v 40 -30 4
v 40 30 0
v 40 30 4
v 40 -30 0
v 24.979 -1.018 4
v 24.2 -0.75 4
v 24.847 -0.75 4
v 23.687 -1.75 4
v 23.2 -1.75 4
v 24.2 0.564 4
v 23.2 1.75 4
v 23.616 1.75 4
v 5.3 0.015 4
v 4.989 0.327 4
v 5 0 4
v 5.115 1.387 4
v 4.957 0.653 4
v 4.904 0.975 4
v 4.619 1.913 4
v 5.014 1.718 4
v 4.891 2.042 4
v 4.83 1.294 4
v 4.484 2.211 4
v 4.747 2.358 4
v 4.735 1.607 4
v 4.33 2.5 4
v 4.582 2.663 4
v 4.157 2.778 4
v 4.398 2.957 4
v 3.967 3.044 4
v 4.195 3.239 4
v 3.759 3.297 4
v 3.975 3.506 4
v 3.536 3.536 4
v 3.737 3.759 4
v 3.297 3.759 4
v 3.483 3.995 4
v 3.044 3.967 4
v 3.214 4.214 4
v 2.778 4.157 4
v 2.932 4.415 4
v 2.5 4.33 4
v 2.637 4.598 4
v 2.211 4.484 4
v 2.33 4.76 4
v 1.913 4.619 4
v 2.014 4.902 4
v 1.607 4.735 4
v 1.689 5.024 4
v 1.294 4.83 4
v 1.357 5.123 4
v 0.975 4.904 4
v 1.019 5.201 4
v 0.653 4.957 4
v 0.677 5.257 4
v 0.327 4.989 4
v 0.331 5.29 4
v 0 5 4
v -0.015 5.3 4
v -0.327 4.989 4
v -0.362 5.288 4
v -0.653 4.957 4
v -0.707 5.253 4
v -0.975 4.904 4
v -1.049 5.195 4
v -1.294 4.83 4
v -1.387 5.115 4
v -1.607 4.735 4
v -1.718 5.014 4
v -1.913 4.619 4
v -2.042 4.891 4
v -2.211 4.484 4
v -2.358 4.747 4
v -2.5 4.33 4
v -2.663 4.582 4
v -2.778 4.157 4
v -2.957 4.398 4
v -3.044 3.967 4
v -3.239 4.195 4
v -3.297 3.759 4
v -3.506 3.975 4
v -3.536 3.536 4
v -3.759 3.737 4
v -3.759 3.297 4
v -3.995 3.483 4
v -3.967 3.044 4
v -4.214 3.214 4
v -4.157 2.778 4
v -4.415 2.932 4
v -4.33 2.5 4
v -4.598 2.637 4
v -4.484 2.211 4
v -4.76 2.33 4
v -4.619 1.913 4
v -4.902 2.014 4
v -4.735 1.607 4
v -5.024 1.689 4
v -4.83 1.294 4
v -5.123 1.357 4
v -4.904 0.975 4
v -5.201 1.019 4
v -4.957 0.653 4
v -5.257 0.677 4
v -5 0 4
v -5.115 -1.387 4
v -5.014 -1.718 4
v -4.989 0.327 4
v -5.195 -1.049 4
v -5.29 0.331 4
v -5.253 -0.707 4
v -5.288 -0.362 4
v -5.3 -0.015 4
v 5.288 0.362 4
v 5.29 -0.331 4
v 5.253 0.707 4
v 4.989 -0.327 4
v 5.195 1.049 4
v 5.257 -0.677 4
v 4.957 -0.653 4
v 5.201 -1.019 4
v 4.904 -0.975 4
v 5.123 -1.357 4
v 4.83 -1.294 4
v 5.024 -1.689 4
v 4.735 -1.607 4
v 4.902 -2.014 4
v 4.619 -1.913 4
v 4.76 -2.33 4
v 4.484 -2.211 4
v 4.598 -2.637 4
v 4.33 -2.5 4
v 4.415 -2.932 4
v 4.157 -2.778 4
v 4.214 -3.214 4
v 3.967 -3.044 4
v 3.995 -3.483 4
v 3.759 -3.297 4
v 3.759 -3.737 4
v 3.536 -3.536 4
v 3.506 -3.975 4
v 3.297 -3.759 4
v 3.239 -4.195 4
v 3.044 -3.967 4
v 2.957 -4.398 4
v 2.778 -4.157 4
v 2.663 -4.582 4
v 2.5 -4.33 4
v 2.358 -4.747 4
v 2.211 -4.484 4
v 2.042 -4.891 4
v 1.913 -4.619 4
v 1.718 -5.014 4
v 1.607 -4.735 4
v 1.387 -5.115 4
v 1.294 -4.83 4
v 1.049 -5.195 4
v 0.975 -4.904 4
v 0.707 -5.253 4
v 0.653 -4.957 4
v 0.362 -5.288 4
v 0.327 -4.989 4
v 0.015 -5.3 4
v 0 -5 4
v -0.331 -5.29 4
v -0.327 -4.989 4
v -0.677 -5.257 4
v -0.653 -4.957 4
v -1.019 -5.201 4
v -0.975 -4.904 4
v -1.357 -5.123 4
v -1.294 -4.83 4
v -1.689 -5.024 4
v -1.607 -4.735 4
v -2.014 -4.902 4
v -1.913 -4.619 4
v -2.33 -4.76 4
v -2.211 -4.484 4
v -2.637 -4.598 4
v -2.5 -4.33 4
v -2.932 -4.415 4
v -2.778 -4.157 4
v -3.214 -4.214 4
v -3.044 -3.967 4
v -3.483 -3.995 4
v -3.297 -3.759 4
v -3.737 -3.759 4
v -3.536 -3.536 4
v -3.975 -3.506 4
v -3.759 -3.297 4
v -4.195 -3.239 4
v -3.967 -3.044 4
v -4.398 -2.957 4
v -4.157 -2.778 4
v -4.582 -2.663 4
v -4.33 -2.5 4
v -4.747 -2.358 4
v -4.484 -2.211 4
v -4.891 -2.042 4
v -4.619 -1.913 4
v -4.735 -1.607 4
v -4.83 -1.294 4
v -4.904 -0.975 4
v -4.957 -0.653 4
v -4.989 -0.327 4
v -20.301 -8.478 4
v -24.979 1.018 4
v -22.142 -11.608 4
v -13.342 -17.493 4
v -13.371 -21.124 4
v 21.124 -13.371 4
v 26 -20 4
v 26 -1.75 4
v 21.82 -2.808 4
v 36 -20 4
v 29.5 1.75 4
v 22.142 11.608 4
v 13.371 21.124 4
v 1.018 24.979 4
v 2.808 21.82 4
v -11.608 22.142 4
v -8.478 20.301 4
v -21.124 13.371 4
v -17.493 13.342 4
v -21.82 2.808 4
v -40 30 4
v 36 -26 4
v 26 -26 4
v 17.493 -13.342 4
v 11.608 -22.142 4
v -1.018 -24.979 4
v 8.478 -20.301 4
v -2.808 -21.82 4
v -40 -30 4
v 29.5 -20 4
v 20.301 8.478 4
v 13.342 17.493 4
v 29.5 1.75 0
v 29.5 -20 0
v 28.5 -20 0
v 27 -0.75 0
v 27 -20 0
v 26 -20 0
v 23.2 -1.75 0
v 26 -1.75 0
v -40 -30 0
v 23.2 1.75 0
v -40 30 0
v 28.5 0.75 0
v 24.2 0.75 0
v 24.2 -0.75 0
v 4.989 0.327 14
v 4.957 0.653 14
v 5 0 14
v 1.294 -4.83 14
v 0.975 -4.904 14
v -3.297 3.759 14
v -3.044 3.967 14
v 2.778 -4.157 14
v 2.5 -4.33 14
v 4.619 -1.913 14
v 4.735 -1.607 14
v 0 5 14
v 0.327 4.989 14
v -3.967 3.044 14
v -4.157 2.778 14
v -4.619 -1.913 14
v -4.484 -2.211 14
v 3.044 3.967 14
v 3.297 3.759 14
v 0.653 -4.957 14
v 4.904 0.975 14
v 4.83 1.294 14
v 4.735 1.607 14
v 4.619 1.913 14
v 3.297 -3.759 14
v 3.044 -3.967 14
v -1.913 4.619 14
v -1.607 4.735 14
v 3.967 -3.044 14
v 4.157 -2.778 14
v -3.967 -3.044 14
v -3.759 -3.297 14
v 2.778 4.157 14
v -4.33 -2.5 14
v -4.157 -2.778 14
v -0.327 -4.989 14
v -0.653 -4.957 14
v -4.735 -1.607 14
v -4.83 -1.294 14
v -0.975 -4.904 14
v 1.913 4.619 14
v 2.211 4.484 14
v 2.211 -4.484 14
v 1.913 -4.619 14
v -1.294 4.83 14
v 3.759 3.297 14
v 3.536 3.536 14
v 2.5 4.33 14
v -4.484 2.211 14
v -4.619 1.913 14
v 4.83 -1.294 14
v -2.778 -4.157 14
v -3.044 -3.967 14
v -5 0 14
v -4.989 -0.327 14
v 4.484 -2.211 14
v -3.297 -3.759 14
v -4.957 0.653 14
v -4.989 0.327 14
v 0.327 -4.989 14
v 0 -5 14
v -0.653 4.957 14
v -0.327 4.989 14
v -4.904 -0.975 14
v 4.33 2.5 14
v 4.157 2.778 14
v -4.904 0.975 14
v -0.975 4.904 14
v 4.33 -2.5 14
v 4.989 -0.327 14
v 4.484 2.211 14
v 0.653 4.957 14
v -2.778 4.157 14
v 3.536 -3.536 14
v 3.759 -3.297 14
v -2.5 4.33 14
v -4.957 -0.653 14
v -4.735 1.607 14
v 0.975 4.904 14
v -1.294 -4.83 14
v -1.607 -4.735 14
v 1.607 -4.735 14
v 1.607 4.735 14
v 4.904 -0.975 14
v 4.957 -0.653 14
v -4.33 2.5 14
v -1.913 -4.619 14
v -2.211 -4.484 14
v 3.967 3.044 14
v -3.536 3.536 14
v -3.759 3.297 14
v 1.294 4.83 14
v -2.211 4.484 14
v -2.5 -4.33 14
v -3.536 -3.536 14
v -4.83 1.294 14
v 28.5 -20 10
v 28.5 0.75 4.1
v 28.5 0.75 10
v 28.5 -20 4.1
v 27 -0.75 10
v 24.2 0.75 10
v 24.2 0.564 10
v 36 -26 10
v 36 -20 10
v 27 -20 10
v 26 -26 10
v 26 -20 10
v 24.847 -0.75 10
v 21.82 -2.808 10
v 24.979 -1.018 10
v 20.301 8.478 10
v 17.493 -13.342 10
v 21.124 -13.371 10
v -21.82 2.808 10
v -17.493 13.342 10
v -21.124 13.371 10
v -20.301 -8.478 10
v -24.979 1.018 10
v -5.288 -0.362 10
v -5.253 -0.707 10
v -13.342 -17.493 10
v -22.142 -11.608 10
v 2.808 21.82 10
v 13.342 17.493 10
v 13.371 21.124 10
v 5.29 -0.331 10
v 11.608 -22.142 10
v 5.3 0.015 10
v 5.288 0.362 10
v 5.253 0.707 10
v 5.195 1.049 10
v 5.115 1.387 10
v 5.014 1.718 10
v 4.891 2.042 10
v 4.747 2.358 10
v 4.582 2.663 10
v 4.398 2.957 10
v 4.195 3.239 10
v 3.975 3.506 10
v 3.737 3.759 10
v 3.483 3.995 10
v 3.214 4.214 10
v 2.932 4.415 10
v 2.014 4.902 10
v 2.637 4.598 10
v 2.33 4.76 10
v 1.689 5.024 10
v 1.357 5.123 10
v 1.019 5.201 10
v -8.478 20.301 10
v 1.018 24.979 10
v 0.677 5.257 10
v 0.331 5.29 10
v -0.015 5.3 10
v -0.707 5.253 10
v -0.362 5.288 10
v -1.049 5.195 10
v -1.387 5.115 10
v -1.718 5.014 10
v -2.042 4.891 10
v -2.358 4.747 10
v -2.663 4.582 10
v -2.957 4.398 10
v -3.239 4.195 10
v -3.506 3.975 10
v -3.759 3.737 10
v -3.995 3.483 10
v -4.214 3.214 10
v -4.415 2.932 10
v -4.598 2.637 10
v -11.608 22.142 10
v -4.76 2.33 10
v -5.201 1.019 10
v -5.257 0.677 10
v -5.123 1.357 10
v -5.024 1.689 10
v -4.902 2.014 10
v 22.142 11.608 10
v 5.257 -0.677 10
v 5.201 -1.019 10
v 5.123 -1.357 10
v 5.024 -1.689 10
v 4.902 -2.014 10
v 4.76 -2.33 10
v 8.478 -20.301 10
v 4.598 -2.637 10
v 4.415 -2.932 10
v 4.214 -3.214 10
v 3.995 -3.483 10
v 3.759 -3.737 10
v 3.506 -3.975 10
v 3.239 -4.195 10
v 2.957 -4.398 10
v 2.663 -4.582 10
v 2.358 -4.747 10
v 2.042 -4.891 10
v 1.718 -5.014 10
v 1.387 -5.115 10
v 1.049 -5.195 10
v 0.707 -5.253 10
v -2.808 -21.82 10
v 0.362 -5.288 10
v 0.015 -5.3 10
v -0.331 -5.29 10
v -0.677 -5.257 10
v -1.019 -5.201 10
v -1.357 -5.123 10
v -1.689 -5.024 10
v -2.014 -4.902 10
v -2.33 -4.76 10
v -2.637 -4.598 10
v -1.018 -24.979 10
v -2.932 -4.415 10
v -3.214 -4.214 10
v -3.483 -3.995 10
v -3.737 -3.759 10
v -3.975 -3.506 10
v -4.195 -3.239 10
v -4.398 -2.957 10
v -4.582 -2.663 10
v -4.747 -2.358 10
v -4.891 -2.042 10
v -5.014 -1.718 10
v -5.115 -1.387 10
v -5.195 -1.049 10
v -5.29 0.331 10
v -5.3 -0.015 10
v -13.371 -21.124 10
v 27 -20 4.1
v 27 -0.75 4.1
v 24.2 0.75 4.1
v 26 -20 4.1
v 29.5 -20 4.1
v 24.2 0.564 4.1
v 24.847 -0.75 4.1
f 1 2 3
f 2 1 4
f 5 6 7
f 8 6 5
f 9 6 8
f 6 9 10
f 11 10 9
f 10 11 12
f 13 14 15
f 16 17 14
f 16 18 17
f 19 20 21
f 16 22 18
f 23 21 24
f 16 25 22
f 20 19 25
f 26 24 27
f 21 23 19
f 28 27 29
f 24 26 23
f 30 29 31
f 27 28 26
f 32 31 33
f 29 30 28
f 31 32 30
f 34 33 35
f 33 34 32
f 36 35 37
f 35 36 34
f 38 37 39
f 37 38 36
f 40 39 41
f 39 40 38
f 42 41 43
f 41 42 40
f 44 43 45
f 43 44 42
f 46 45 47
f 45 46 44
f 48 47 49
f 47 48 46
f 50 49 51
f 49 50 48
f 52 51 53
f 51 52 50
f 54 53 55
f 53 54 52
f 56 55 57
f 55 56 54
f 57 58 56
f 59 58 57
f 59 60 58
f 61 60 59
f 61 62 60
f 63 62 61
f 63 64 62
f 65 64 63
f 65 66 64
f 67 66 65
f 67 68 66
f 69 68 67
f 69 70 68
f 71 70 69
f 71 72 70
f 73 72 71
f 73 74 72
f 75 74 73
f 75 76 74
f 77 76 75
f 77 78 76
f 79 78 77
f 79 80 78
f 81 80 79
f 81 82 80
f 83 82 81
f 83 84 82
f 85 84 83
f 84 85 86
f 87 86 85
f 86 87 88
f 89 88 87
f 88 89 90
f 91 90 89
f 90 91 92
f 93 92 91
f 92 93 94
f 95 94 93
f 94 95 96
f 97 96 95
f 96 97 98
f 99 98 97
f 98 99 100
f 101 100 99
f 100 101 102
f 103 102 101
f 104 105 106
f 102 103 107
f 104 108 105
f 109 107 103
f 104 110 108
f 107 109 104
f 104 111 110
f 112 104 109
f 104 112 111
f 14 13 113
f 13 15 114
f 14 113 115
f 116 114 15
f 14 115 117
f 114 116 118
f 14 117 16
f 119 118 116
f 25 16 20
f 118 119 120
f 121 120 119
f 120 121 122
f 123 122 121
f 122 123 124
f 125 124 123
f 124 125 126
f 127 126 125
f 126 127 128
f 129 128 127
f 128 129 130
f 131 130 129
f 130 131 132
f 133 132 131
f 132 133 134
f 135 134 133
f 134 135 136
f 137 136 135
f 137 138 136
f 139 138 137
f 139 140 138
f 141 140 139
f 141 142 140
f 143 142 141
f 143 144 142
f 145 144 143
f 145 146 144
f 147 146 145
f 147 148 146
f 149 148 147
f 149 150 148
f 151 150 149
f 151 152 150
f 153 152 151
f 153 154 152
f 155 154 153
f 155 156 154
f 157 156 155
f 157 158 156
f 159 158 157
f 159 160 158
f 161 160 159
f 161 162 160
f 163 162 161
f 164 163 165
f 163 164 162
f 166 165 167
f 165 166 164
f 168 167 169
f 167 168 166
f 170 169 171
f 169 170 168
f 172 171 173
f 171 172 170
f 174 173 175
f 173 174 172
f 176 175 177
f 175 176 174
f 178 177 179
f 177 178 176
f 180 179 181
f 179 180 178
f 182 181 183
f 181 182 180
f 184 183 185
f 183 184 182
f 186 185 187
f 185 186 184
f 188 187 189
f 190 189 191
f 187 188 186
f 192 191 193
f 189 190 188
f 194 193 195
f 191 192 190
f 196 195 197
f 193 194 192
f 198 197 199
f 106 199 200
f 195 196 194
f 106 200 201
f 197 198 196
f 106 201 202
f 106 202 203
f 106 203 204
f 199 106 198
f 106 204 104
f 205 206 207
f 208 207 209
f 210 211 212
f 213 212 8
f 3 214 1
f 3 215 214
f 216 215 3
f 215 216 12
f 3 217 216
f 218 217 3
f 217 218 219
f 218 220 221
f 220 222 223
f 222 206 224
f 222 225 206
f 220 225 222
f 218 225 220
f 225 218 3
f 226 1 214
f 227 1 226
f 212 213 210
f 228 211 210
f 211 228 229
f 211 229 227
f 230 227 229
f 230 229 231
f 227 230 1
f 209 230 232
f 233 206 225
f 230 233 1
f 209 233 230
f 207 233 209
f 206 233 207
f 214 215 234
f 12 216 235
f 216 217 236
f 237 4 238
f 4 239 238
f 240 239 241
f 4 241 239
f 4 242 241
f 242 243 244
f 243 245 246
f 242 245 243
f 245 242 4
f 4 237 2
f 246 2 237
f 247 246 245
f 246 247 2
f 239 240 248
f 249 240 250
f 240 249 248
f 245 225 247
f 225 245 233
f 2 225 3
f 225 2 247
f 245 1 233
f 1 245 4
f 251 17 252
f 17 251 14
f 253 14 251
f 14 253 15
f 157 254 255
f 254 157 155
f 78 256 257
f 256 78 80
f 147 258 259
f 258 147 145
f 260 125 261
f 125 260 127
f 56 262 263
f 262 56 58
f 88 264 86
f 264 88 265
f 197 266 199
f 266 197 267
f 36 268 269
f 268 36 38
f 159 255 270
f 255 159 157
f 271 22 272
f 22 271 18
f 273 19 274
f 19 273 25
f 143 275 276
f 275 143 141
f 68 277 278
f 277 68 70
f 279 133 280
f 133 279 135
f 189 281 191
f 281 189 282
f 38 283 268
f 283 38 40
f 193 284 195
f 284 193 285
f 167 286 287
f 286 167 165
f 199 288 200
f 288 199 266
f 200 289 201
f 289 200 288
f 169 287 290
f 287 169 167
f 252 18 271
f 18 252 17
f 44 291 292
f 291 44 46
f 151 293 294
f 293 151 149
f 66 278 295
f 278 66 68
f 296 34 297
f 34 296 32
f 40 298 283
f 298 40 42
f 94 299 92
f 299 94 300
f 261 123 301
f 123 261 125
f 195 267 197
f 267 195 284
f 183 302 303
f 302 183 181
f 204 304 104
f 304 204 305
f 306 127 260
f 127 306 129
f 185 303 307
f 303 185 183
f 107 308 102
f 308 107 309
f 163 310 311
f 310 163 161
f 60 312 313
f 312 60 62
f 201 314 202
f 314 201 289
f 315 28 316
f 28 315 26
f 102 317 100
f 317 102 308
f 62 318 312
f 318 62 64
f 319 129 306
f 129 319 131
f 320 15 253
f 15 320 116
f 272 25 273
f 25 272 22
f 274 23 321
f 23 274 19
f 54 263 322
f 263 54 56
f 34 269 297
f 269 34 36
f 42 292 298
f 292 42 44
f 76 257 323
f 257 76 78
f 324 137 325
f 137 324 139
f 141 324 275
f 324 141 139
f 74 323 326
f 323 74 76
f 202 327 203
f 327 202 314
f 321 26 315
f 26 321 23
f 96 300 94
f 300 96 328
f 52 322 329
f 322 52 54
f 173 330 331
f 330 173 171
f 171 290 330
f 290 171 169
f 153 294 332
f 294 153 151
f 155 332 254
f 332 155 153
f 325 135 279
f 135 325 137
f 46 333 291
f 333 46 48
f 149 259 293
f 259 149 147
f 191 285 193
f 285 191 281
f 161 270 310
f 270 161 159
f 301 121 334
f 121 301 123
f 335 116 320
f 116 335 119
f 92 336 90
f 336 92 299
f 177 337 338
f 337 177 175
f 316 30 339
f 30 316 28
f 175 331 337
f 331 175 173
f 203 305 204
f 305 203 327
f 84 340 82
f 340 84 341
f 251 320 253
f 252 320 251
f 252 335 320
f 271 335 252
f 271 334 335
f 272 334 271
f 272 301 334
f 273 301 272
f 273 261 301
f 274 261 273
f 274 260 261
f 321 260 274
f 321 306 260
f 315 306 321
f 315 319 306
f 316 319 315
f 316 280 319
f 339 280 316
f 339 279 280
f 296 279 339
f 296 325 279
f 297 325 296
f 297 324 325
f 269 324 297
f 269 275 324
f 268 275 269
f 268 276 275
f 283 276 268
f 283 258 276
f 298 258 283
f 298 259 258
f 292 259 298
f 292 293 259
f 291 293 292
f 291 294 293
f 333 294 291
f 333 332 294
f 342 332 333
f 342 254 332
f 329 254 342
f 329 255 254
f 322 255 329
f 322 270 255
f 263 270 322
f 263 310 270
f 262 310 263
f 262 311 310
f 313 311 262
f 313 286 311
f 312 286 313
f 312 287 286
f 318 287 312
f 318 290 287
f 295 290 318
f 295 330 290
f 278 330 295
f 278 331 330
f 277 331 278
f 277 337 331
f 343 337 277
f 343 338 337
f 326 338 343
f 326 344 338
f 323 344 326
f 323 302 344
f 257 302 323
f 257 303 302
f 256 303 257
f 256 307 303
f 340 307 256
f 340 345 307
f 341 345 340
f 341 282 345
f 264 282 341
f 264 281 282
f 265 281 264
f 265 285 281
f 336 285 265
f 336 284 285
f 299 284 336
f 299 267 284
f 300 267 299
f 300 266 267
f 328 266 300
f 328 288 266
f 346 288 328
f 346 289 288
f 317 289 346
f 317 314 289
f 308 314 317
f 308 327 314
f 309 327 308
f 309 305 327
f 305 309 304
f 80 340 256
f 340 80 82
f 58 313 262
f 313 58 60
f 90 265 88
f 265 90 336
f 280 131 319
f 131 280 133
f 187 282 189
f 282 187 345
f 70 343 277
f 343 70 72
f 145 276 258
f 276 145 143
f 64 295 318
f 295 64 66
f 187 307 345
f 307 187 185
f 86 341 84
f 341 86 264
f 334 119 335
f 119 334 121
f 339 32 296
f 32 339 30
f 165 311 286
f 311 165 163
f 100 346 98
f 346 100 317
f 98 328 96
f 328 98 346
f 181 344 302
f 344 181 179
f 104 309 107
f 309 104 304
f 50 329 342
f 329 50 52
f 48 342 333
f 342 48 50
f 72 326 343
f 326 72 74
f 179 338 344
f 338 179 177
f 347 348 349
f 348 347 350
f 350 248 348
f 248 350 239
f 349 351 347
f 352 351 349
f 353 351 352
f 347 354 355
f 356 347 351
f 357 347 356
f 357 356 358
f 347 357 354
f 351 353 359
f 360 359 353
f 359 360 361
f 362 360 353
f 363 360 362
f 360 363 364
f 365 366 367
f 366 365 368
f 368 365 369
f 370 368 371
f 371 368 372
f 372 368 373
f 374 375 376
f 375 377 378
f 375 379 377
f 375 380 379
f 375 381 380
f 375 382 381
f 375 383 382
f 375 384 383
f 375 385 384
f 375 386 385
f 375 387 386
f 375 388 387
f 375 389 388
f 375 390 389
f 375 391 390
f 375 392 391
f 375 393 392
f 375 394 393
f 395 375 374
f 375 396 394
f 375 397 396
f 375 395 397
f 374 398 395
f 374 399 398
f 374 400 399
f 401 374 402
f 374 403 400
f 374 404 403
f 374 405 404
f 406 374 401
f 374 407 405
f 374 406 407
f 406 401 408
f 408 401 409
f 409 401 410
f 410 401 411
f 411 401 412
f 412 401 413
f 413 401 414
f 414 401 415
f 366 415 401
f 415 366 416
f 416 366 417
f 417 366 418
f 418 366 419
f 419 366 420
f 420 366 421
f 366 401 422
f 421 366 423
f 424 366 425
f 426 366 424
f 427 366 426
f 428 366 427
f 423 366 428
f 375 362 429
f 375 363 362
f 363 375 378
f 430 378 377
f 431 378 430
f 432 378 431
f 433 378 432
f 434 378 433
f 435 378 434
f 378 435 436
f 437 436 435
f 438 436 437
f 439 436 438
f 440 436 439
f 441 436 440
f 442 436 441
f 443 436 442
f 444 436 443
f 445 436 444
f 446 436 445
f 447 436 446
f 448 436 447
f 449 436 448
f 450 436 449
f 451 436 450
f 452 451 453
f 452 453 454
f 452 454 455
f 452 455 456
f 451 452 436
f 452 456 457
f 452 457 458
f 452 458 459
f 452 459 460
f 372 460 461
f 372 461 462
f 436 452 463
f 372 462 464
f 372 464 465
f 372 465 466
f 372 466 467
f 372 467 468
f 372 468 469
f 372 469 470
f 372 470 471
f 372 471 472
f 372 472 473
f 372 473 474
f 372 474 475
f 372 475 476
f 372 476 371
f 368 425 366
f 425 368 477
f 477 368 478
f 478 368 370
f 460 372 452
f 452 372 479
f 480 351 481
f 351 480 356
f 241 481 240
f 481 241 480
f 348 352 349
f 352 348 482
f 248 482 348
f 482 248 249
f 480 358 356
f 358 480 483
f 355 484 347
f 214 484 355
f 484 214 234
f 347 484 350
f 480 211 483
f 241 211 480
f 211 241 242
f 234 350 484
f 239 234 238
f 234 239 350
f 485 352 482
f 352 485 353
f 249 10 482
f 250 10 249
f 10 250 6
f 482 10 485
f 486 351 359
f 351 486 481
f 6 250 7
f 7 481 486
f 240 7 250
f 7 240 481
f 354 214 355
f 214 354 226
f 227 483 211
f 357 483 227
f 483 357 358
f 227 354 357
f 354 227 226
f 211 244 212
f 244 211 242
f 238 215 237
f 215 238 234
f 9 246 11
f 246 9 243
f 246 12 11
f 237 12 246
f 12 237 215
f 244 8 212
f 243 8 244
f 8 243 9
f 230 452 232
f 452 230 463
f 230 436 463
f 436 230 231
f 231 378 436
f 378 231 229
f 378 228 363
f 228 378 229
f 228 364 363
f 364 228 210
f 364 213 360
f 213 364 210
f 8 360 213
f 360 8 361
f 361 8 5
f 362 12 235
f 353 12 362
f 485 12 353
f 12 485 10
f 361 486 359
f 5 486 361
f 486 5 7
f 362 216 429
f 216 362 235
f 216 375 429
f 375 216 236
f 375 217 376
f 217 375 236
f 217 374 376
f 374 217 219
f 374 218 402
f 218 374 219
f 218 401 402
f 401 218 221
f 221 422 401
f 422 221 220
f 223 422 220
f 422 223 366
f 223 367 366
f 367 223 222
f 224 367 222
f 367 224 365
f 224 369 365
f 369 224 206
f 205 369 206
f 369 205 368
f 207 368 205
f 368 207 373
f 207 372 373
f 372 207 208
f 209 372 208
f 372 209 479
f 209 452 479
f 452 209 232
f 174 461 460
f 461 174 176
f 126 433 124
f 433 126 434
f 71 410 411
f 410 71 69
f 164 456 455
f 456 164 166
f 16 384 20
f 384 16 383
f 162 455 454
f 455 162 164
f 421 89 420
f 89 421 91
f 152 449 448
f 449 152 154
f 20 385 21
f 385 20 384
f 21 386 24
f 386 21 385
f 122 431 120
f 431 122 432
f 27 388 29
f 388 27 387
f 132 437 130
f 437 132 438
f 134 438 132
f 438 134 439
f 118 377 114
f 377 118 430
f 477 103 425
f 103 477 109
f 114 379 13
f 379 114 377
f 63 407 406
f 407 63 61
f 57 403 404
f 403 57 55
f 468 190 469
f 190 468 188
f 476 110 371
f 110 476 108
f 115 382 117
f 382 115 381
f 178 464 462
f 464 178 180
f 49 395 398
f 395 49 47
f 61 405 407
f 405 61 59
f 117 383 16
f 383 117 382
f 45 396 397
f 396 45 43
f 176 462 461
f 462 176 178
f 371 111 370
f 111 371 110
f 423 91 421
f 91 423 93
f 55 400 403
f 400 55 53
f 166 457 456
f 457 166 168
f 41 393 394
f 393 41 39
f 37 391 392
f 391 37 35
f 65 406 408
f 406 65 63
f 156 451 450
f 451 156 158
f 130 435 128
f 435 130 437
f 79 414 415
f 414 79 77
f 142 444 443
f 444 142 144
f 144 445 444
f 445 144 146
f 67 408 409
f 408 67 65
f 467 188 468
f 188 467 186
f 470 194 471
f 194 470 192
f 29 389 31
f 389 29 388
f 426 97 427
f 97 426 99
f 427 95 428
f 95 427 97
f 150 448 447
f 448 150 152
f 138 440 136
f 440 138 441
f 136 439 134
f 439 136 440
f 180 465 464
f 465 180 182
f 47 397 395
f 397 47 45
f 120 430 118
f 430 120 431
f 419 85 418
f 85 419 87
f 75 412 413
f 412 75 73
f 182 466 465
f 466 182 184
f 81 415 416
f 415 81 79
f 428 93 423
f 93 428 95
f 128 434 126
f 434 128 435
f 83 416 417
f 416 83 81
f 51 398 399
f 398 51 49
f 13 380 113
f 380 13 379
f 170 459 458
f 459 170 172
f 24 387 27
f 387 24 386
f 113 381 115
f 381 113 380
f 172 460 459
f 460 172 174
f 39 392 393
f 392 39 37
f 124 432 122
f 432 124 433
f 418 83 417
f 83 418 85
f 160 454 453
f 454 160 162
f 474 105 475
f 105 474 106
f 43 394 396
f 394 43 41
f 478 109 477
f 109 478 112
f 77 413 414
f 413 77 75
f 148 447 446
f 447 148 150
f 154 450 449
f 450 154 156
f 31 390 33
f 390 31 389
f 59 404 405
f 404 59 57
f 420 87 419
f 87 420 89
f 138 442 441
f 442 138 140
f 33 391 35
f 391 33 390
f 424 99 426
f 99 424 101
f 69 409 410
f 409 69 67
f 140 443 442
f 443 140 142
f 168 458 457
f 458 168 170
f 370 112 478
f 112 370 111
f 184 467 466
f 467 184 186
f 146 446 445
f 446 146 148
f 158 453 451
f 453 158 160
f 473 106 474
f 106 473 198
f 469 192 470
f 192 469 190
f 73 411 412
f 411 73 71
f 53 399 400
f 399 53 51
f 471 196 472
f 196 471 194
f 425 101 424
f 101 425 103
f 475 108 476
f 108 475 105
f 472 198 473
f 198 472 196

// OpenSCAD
cadverify_only = "";
module instance(name, part, unit = 1) {
    echo(cadverify_instance = [name, part, unit]);
    if (cadverify_only == "" || cadverify_only == name) children();
}

// Part selector: base, wheel, assembly
part = "assembly"; // [base, wheel, assembly]

$fn = 96;

// Parameters
Rt = 25;        // wheel tip radius (50mm across)
Rr = 22;        // wheel root radius
Nteeth = 12;
wheel_t = 6;    // wheel thickness
bore_r = 5.3;   // wheel bore radius (post 5.0 + 0.3 clearance)
post_r = 5;
post_h = 14;    // base bottom to post top
base_t = 4;     // base plate thickness
plate_x = 80;
plate_y = 60;
gap_angle = 37.3333333; // gap center for nominal assembly

module wheel() {
    pts = [ for (k=[0:2*Nteeth-1])
        let(i=floor(k/2),
            a = (k%2==0) ? i*360/Nteeth : i*360/Nteeth+5,
            r = (k%2==0) ? Rr : Rt)
        [r*cos(a), r*sin(a)] ];
    difference() {
        linear_extrude(height=wheel_t, convexity=4)
            polygon(pts);
        translate([0,0,-0.1])
            cylinder(h=wheel_t+0.2, r=bore_r);
    }
}

module base() {
    difference() {
        union() {
            // plate
            translate([-plate_x/2, -plate_y/2, 0])
                cube([plate_x, plate_y, base_t]);
            // post
            cylinder(h=post_h, r=post_r);
            // pawl backbone (tall)
            translate([27, -20, 0])
                cube([1.5, 20.75, 10]);
            // pawl finger (tall, radial)
            translate([24.2, -0.75, 0])
                cube([4.3, 1.5, 10]);
            // anchor block (full height fixation)
            translate([26, -26, 0])
                cube([10, 6, 10]);
        }
        // slot voids through plate (z -0.1..4.1)
        translate([26, -20, -0.1]) cube([1, 19.25, 4.2]);      // west of backbone
        translate([28.5, -20, -0.1]) cube([1, 20.75, 4.2]);    // east of backbone
        translate([23.2, 0.75, -0.1]) cube([6.3, 1, 4.2]);      // north
        translate([23.2, -1.75, -0.1]) cube([3.8, 1, 4.2]);     // south of finger tip
        translate([23.2, -1.75, -0.1]) cube([1, 3.5, 4.2]);     // west of tip
    }
}

if (part == "wheel") {
    echo(cadverify_spec = [
        ["bounds", [[-25, -25, 0], [25, 25, 6]]],
        ["bodies", 1],
        ["through_holes", 1],
        ["support_faces", [["bottom", "-z", 1000]]],
        ["overhangs_allowed", []],
        ["copies", 1],
        ["details", [
            ["hub", "material", [[5, 5, 0.5], [10, 10, 5.5]], 0.9],
            ["bore", "hole", [0, 0, 7], [0, 0, -1], [[0, 10.6], [5, 10.6]]],
            ["rim", "thickness", [15, 0, 7], [0, 0, -1], 6],
            ["teeth", "view", [[20, -15, 0], [25, 15, 6]]]
        ]]
    ]);
    wheel();
} else if (part == "base") {
    echo(cadverify_spec = [
        ["bounds", [[-40, -30, 0], [40, 30, 14]]],
        ["bodies", 1],
        ["through_holes", 1],
        ["support_faces", [["bottom", "-z", 4000]]],
        ["overhangs_allowed", []],
        ["copies", 1],
        ["details", [
            ["pawl_arm", "material", [[27.1, -10, 4.1], [28.4, -5, 9.9]], 0.9],
            ["slot", "void", [[26.1, -15, 0.5], [26.9, -5, 3.5]], 0.9],
            ["base_floor", "thickness", [-20, 20, -1], [0, 0, 1], 4],
            ["pawl_tip", "view", [[23, -2, 4], [26, 2, 10]]]
        ]]
    ]);
    base();
} else if (part == "assembly") {
    echo(cadverify_spec = [
        ["bounds", [[-40, -30, 0], [40, 30, 14]]],
        ["support_faces", [["table", "-z", 4000]]],
        ["motions", [
            ["free", ["wheel1"], "rotate", [0, 0, 4], [0, 0, 1], [0, -30]],
            ["locked", ["wheel1"], "rotate", [0, 0, 4], [0, 0, 1], [0, 5]]
        ]],
        ["assembly_order", [
            [["base1"], [0, 0, 0]],
            [["wheel1"], [0, 0, -1]]
        ]]
    ]);
    instance("base1", "base") base();
    instance("wheel1", "wheel") translate([0, 0, 4]) rotate([0, 0, -gap_angle]) wheel();
}
